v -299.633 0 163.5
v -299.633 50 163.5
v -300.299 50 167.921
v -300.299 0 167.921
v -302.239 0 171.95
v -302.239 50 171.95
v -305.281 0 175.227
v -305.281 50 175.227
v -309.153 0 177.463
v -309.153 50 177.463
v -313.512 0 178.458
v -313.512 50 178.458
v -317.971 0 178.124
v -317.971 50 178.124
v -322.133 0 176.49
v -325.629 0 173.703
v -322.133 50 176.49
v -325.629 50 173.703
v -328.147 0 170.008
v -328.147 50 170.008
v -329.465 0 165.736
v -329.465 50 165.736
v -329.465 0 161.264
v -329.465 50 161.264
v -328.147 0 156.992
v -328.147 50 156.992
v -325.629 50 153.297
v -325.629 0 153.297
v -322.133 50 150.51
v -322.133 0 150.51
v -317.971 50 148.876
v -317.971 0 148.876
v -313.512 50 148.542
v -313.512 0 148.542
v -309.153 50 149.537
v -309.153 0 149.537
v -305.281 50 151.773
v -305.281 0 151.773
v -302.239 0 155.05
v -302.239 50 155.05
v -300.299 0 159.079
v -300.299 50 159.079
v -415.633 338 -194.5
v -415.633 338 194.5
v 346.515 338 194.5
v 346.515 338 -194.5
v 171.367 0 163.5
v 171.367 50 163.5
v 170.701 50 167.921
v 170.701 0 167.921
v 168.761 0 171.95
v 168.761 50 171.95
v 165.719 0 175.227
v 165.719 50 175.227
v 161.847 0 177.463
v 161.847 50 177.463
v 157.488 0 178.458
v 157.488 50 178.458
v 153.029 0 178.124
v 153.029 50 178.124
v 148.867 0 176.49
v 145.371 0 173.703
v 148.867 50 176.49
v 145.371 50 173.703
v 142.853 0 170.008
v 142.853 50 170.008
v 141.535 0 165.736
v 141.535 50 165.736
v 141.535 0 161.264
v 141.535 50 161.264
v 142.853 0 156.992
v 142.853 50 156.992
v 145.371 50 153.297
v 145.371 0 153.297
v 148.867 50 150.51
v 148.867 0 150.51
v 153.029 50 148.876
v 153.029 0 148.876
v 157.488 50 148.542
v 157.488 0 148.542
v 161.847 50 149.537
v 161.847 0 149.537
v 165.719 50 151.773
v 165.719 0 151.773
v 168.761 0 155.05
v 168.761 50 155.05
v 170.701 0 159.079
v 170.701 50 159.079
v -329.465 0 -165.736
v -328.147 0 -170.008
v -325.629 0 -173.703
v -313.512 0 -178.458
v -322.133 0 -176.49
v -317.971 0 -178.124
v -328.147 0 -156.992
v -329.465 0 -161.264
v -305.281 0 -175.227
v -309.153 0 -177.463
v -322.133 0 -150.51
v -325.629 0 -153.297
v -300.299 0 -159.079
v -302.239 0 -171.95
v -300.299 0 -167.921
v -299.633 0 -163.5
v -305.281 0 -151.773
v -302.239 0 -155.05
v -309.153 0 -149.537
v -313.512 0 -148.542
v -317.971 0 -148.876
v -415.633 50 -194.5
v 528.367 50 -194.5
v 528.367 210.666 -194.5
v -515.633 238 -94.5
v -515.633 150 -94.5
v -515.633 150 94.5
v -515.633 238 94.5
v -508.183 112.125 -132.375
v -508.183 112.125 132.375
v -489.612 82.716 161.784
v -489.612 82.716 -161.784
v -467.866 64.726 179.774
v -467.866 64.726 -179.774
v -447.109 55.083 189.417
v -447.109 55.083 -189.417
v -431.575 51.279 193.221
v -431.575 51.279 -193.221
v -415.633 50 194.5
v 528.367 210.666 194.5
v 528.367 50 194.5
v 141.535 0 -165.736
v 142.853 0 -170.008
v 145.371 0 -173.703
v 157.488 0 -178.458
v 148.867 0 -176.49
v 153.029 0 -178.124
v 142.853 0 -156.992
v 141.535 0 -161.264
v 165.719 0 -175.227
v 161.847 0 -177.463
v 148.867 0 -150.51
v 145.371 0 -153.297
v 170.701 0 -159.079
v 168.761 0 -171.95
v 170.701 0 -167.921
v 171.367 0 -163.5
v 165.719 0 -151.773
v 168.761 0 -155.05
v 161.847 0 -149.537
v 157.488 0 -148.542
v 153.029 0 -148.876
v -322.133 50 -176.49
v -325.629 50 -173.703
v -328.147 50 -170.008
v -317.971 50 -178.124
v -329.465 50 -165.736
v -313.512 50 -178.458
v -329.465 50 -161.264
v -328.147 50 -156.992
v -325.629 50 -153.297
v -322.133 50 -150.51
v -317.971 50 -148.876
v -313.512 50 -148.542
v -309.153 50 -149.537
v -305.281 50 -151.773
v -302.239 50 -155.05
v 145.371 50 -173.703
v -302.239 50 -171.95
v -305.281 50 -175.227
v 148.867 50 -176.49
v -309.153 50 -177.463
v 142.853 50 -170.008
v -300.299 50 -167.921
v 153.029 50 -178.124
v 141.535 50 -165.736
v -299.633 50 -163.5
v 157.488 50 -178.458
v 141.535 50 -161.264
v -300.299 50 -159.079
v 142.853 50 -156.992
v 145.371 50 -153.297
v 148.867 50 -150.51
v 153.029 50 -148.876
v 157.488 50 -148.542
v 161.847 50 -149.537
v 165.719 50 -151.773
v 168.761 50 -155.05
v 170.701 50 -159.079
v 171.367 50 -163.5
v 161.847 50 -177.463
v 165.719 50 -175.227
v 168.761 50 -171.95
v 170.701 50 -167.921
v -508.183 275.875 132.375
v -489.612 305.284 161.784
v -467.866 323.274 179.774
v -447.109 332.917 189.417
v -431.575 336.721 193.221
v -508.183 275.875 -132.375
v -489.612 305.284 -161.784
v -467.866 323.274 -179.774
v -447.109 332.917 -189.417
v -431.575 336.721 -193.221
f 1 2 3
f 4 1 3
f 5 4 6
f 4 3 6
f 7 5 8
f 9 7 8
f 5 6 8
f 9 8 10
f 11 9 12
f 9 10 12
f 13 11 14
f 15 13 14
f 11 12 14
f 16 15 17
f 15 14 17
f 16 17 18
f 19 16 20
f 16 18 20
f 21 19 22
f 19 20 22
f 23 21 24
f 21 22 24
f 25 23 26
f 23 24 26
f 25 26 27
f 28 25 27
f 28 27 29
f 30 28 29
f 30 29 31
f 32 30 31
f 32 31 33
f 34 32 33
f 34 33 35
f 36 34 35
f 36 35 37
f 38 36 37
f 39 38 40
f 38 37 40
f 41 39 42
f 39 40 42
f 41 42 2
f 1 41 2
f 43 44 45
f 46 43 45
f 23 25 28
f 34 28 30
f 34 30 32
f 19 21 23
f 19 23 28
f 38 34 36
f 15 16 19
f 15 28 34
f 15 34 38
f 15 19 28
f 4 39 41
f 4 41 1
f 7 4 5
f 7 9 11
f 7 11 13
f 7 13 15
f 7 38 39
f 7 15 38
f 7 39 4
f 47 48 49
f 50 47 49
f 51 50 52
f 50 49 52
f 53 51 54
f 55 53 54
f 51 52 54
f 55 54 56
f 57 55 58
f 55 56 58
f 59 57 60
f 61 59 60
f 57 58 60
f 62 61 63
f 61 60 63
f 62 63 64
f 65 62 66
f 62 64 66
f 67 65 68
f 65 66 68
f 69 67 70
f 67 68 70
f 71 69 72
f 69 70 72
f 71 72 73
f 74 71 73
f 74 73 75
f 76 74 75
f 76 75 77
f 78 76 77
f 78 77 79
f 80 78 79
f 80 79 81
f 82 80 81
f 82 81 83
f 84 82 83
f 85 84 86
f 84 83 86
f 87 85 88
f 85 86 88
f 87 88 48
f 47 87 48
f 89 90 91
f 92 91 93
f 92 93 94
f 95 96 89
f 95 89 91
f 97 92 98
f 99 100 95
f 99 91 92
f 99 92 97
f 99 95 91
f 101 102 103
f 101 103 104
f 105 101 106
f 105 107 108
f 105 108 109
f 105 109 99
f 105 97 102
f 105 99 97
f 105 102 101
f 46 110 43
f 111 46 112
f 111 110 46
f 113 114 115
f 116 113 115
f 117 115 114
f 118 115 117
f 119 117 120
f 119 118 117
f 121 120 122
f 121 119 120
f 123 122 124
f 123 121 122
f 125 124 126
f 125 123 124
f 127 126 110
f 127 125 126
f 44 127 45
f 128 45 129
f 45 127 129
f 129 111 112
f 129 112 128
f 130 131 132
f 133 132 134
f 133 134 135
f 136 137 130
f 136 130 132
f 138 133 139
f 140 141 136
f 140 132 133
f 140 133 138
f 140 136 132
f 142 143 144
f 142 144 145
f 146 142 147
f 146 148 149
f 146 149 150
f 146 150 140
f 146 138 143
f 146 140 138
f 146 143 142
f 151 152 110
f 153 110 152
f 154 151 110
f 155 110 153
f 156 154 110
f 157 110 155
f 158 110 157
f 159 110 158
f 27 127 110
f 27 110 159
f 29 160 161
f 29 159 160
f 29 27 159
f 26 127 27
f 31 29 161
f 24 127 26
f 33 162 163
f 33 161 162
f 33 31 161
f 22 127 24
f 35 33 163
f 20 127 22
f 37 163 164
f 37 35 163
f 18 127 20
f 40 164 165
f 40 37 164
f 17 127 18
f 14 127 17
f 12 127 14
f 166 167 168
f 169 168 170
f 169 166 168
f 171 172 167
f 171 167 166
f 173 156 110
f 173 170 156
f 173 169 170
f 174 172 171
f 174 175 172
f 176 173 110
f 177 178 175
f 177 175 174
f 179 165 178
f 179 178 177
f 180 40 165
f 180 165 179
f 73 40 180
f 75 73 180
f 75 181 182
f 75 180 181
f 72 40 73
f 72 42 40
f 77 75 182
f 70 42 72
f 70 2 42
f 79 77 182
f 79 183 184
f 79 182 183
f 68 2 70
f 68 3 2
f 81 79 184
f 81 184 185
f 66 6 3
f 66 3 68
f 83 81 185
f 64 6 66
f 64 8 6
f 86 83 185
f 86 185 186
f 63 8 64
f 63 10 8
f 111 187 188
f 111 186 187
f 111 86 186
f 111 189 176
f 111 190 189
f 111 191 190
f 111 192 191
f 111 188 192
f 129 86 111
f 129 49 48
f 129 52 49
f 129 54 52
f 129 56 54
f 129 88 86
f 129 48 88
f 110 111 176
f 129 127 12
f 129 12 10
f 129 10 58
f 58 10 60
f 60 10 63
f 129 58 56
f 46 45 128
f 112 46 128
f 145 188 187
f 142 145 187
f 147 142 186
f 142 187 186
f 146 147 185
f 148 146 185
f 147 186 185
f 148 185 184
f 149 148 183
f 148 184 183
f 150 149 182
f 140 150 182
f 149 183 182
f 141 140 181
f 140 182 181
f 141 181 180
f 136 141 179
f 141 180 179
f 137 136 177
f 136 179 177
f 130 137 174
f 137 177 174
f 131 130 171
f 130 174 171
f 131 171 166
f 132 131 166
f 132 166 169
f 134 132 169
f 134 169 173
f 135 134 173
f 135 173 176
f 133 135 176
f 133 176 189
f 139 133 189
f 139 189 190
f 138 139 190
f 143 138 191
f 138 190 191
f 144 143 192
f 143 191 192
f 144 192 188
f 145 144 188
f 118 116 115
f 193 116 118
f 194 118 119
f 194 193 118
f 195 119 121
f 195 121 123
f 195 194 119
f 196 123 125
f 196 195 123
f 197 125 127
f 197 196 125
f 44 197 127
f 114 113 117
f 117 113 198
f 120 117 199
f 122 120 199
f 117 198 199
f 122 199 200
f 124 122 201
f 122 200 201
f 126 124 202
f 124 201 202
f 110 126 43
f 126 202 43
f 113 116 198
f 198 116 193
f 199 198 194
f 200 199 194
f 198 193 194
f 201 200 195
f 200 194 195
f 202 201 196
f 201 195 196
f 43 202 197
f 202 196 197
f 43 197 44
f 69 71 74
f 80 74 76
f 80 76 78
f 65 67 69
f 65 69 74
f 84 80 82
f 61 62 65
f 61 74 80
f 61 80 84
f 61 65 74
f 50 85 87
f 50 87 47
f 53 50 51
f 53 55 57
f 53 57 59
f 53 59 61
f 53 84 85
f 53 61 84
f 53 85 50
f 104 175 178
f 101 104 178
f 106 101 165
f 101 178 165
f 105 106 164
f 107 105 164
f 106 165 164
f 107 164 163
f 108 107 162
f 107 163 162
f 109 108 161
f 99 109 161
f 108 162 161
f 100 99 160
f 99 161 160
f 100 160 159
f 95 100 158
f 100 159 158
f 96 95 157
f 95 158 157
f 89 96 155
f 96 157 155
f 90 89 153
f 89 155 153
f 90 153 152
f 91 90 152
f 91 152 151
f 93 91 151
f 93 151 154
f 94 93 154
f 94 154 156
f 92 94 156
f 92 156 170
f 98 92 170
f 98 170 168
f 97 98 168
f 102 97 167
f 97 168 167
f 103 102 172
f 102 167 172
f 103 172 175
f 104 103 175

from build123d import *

# Parameters (mm, degrees)
F1_W     = 1044
F1_H     = 389
F2_DEPTH = 288
F3_R     = 100
F5_DEPTH = 389.001
F6_R     = 15
F7_DEPTH = 50


with BuildPart() as f2:
    # F1 (on Front) → F2 (new body)
    with BuildSketch(Plane.XZ):
        with Locations((6.3670966774, 0)):
            Rectangle(F1_W, F1_H)
    extrude(amount=-F2_DEPTH)

    # F3
    f3_edges = [f2.edges().sort_by_distance(p)[0] for p in [
        (-515.632903, 144, 194.5),
        (-515.632903, 144, -194.5),
        (-515.632903, 0, 0),
        (-515.632903, 288, 0),
    ]]
    fillet(f3_edges, radius=F3_R)

    # F4 (on face) → F5 (cut, through all)
    with BuildSketch(Plane.XY.offset(194.5)):
        Polygon((528.3670966774, 288), (346.5153428453, 288), (528.3670966774, 160.6660311301), align=None)
    extrude(amount=-F5_DEPTH, mode=Mode.SUBTRACT)

    # F6 (on face) → F7 (join)
    with BuildSketch(Plane.XZ):
        with Locations((-314.6329033226, 163.5)):
            Circle(F6_R)
        with Locations((156.3670966774, 163.5)):
            Circle(F6_R)
        with Locations((156.3670966774, -163.5)):
            Circle(F6_R)
        with Locations((-314.6329033226, -163.5)):
            Circle(F6_R)
    extrude(amount=F7_DEPTH)


with BuildPart() as f2_1:
    # F8: moved
    add(f2.part.moved(Location((0, 50, 0))))


solid = f2_1.part
